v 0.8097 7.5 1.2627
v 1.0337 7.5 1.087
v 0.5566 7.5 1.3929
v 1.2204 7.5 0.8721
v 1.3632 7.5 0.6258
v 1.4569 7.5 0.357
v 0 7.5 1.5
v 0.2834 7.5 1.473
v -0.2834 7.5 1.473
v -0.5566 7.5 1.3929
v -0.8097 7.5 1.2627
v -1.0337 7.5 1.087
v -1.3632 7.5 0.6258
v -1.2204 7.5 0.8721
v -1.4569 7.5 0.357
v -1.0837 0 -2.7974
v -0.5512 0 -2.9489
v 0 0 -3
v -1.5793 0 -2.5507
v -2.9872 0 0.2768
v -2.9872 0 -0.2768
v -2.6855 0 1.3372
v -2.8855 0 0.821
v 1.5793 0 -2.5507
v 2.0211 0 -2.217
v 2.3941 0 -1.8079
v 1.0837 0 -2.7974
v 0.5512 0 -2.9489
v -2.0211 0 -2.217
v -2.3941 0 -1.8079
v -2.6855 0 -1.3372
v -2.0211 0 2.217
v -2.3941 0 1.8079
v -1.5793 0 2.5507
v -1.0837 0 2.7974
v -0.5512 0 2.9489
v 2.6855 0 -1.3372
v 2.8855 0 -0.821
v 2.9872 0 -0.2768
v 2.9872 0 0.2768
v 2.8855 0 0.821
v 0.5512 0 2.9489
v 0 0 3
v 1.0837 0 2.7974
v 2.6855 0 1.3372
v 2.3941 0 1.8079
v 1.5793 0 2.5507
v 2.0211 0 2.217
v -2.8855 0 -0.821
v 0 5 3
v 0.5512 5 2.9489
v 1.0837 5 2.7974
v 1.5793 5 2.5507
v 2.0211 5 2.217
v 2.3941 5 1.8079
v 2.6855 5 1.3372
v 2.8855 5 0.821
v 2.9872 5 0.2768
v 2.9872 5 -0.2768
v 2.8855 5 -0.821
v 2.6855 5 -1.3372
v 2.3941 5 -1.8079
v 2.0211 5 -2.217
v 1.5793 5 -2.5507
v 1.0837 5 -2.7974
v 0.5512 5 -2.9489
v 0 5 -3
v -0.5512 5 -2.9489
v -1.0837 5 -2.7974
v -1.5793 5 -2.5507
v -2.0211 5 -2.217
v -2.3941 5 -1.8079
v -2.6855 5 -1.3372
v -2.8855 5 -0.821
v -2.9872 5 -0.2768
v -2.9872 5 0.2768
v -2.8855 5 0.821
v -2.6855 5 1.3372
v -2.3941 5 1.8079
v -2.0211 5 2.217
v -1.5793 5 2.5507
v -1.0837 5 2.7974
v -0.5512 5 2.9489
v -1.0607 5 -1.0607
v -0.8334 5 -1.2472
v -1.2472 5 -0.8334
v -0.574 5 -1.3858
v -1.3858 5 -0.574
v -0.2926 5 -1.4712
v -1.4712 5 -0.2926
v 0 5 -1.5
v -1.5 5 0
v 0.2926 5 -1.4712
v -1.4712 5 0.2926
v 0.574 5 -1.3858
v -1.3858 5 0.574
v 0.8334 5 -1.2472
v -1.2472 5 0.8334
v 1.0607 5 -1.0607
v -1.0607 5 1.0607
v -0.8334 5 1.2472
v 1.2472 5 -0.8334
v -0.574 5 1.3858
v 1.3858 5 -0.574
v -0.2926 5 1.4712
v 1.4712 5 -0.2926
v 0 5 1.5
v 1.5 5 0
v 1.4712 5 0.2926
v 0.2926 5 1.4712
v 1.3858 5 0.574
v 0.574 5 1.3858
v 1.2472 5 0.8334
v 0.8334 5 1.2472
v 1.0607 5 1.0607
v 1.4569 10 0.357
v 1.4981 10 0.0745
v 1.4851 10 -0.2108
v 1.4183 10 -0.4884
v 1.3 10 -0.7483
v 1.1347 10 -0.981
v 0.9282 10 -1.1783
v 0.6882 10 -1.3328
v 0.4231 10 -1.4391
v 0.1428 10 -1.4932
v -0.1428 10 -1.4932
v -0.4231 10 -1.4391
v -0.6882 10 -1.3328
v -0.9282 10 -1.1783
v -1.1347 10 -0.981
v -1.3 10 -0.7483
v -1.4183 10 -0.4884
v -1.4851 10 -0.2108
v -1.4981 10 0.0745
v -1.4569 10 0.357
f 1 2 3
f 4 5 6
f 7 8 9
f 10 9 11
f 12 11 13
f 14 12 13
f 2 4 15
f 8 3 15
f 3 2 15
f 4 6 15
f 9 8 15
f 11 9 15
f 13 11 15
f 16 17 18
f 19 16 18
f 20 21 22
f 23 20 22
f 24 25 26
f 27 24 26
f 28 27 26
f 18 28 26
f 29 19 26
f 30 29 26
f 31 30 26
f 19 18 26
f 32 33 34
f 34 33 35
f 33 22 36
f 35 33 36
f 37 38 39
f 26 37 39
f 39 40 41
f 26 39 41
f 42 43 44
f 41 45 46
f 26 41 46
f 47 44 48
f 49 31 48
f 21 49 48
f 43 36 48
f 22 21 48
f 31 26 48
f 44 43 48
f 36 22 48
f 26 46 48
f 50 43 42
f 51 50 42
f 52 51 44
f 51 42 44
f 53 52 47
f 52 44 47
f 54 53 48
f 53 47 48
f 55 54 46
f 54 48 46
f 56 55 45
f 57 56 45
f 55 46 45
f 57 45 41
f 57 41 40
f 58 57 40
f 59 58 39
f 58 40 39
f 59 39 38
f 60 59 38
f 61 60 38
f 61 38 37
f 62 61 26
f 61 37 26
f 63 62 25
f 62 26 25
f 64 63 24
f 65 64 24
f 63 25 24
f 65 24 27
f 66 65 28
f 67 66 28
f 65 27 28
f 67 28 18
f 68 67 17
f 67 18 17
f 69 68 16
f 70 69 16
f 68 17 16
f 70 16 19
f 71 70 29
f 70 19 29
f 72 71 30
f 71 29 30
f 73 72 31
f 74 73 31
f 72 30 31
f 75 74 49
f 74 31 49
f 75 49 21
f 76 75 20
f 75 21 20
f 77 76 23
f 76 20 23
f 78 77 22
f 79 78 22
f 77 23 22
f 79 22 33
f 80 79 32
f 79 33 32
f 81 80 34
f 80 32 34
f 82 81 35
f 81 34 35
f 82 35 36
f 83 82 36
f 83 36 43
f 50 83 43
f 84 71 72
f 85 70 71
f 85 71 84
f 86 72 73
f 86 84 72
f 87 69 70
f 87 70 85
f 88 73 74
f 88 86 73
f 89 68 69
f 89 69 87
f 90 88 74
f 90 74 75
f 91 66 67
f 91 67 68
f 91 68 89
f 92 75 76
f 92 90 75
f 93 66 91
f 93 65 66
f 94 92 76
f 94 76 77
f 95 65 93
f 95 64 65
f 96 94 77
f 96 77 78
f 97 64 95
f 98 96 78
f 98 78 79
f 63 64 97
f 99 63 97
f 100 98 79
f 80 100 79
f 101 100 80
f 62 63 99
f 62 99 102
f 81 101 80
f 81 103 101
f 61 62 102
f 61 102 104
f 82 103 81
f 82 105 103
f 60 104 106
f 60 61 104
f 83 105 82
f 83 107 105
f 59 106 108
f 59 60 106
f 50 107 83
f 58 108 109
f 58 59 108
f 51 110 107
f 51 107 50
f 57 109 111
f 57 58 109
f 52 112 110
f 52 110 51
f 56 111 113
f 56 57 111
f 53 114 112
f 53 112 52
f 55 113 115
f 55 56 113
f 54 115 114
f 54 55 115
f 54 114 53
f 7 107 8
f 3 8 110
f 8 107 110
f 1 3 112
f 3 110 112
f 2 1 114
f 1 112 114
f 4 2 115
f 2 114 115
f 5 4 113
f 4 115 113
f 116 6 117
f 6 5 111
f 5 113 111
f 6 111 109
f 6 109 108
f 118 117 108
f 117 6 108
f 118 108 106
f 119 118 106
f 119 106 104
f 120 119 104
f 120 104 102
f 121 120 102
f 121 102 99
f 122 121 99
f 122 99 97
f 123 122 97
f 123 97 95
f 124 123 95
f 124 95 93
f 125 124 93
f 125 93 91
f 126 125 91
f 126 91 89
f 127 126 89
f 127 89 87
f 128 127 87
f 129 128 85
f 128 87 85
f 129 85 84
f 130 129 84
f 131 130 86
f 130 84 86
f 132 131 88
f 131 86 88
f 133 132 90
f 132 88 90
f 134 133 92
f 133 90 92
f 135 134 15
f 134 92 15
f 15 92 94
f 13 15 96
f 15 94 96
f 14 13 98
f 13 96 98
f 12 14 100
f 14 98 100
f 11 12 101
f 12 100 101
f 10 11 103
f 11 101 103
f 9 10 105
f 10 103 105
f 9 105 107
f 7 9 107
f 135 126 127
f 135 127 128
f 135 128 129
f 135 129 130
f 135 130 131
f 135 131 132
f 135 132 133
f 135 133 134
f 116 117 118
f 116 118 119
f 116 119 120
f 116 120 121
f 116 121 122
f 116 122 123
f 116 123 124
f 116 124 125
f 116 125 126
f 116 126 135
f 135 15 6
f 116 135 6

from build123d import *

# Parameters (mm, degrees)
SKETCH2_R           = 3
BOSS_EXTRUDE1_DEPTH = 5
SKETCH3_R           = 1.5
BOSS_EXTRUDE2_DEPTH = 5
CUT_EXTRUDE1_START  = -2.5
CUT_EXTRUDE1_DEPTH  = 2.5


with BuildPart() as part:
    # Sketch2 → Boss-Extrude1 (new body)
    with BuildSketch(Plane(origin=(0, 0, 0), x_dir=(1, 0, 0), z_dir=(0, 1, 0))):
        with Locations(Location((0, 0, 0), (0, 0, 270))):
            Circle(SKETCH2_R)
    extrude(amount=BOSS_EXTRUDE1_DEPTH)

    # Sketch3 → Boss-Extrude2 (add)
    with BuildSketch(Plane(origin=(0, 5, 0), x_dir=(1, 0, 0), z_dir=(0, 1, 0))):
        with Locations(Location((0, 0, 0), (0, 0, 270))):
            Circle(SKETCH3_R)
    extrude(amount=BOSS_EXTRUDE2_DEPTH)

    # Sketch4 → Cut-Extrude1 (cut)
    with BuildSketch(Plane(origin=(0, 10, 0), x_dir=(1, 0, 0), z_dir=(0, 1, 0)).offset(CUT_EXTRUDE1_START)):
        with BuildLine():
            Line((-1.456893676, -0.357016549), (1.456893676, -0.357016549))
            ThreePointArc((1.456893676, -0.357016549), (0, -1.5), (-1.456893676, -0.357016549))
        make_face()
    extrude(amount=CUT_EXTRUDE1_DEPTH, mode=Mode.SUBTRACT)


solid = part.part
